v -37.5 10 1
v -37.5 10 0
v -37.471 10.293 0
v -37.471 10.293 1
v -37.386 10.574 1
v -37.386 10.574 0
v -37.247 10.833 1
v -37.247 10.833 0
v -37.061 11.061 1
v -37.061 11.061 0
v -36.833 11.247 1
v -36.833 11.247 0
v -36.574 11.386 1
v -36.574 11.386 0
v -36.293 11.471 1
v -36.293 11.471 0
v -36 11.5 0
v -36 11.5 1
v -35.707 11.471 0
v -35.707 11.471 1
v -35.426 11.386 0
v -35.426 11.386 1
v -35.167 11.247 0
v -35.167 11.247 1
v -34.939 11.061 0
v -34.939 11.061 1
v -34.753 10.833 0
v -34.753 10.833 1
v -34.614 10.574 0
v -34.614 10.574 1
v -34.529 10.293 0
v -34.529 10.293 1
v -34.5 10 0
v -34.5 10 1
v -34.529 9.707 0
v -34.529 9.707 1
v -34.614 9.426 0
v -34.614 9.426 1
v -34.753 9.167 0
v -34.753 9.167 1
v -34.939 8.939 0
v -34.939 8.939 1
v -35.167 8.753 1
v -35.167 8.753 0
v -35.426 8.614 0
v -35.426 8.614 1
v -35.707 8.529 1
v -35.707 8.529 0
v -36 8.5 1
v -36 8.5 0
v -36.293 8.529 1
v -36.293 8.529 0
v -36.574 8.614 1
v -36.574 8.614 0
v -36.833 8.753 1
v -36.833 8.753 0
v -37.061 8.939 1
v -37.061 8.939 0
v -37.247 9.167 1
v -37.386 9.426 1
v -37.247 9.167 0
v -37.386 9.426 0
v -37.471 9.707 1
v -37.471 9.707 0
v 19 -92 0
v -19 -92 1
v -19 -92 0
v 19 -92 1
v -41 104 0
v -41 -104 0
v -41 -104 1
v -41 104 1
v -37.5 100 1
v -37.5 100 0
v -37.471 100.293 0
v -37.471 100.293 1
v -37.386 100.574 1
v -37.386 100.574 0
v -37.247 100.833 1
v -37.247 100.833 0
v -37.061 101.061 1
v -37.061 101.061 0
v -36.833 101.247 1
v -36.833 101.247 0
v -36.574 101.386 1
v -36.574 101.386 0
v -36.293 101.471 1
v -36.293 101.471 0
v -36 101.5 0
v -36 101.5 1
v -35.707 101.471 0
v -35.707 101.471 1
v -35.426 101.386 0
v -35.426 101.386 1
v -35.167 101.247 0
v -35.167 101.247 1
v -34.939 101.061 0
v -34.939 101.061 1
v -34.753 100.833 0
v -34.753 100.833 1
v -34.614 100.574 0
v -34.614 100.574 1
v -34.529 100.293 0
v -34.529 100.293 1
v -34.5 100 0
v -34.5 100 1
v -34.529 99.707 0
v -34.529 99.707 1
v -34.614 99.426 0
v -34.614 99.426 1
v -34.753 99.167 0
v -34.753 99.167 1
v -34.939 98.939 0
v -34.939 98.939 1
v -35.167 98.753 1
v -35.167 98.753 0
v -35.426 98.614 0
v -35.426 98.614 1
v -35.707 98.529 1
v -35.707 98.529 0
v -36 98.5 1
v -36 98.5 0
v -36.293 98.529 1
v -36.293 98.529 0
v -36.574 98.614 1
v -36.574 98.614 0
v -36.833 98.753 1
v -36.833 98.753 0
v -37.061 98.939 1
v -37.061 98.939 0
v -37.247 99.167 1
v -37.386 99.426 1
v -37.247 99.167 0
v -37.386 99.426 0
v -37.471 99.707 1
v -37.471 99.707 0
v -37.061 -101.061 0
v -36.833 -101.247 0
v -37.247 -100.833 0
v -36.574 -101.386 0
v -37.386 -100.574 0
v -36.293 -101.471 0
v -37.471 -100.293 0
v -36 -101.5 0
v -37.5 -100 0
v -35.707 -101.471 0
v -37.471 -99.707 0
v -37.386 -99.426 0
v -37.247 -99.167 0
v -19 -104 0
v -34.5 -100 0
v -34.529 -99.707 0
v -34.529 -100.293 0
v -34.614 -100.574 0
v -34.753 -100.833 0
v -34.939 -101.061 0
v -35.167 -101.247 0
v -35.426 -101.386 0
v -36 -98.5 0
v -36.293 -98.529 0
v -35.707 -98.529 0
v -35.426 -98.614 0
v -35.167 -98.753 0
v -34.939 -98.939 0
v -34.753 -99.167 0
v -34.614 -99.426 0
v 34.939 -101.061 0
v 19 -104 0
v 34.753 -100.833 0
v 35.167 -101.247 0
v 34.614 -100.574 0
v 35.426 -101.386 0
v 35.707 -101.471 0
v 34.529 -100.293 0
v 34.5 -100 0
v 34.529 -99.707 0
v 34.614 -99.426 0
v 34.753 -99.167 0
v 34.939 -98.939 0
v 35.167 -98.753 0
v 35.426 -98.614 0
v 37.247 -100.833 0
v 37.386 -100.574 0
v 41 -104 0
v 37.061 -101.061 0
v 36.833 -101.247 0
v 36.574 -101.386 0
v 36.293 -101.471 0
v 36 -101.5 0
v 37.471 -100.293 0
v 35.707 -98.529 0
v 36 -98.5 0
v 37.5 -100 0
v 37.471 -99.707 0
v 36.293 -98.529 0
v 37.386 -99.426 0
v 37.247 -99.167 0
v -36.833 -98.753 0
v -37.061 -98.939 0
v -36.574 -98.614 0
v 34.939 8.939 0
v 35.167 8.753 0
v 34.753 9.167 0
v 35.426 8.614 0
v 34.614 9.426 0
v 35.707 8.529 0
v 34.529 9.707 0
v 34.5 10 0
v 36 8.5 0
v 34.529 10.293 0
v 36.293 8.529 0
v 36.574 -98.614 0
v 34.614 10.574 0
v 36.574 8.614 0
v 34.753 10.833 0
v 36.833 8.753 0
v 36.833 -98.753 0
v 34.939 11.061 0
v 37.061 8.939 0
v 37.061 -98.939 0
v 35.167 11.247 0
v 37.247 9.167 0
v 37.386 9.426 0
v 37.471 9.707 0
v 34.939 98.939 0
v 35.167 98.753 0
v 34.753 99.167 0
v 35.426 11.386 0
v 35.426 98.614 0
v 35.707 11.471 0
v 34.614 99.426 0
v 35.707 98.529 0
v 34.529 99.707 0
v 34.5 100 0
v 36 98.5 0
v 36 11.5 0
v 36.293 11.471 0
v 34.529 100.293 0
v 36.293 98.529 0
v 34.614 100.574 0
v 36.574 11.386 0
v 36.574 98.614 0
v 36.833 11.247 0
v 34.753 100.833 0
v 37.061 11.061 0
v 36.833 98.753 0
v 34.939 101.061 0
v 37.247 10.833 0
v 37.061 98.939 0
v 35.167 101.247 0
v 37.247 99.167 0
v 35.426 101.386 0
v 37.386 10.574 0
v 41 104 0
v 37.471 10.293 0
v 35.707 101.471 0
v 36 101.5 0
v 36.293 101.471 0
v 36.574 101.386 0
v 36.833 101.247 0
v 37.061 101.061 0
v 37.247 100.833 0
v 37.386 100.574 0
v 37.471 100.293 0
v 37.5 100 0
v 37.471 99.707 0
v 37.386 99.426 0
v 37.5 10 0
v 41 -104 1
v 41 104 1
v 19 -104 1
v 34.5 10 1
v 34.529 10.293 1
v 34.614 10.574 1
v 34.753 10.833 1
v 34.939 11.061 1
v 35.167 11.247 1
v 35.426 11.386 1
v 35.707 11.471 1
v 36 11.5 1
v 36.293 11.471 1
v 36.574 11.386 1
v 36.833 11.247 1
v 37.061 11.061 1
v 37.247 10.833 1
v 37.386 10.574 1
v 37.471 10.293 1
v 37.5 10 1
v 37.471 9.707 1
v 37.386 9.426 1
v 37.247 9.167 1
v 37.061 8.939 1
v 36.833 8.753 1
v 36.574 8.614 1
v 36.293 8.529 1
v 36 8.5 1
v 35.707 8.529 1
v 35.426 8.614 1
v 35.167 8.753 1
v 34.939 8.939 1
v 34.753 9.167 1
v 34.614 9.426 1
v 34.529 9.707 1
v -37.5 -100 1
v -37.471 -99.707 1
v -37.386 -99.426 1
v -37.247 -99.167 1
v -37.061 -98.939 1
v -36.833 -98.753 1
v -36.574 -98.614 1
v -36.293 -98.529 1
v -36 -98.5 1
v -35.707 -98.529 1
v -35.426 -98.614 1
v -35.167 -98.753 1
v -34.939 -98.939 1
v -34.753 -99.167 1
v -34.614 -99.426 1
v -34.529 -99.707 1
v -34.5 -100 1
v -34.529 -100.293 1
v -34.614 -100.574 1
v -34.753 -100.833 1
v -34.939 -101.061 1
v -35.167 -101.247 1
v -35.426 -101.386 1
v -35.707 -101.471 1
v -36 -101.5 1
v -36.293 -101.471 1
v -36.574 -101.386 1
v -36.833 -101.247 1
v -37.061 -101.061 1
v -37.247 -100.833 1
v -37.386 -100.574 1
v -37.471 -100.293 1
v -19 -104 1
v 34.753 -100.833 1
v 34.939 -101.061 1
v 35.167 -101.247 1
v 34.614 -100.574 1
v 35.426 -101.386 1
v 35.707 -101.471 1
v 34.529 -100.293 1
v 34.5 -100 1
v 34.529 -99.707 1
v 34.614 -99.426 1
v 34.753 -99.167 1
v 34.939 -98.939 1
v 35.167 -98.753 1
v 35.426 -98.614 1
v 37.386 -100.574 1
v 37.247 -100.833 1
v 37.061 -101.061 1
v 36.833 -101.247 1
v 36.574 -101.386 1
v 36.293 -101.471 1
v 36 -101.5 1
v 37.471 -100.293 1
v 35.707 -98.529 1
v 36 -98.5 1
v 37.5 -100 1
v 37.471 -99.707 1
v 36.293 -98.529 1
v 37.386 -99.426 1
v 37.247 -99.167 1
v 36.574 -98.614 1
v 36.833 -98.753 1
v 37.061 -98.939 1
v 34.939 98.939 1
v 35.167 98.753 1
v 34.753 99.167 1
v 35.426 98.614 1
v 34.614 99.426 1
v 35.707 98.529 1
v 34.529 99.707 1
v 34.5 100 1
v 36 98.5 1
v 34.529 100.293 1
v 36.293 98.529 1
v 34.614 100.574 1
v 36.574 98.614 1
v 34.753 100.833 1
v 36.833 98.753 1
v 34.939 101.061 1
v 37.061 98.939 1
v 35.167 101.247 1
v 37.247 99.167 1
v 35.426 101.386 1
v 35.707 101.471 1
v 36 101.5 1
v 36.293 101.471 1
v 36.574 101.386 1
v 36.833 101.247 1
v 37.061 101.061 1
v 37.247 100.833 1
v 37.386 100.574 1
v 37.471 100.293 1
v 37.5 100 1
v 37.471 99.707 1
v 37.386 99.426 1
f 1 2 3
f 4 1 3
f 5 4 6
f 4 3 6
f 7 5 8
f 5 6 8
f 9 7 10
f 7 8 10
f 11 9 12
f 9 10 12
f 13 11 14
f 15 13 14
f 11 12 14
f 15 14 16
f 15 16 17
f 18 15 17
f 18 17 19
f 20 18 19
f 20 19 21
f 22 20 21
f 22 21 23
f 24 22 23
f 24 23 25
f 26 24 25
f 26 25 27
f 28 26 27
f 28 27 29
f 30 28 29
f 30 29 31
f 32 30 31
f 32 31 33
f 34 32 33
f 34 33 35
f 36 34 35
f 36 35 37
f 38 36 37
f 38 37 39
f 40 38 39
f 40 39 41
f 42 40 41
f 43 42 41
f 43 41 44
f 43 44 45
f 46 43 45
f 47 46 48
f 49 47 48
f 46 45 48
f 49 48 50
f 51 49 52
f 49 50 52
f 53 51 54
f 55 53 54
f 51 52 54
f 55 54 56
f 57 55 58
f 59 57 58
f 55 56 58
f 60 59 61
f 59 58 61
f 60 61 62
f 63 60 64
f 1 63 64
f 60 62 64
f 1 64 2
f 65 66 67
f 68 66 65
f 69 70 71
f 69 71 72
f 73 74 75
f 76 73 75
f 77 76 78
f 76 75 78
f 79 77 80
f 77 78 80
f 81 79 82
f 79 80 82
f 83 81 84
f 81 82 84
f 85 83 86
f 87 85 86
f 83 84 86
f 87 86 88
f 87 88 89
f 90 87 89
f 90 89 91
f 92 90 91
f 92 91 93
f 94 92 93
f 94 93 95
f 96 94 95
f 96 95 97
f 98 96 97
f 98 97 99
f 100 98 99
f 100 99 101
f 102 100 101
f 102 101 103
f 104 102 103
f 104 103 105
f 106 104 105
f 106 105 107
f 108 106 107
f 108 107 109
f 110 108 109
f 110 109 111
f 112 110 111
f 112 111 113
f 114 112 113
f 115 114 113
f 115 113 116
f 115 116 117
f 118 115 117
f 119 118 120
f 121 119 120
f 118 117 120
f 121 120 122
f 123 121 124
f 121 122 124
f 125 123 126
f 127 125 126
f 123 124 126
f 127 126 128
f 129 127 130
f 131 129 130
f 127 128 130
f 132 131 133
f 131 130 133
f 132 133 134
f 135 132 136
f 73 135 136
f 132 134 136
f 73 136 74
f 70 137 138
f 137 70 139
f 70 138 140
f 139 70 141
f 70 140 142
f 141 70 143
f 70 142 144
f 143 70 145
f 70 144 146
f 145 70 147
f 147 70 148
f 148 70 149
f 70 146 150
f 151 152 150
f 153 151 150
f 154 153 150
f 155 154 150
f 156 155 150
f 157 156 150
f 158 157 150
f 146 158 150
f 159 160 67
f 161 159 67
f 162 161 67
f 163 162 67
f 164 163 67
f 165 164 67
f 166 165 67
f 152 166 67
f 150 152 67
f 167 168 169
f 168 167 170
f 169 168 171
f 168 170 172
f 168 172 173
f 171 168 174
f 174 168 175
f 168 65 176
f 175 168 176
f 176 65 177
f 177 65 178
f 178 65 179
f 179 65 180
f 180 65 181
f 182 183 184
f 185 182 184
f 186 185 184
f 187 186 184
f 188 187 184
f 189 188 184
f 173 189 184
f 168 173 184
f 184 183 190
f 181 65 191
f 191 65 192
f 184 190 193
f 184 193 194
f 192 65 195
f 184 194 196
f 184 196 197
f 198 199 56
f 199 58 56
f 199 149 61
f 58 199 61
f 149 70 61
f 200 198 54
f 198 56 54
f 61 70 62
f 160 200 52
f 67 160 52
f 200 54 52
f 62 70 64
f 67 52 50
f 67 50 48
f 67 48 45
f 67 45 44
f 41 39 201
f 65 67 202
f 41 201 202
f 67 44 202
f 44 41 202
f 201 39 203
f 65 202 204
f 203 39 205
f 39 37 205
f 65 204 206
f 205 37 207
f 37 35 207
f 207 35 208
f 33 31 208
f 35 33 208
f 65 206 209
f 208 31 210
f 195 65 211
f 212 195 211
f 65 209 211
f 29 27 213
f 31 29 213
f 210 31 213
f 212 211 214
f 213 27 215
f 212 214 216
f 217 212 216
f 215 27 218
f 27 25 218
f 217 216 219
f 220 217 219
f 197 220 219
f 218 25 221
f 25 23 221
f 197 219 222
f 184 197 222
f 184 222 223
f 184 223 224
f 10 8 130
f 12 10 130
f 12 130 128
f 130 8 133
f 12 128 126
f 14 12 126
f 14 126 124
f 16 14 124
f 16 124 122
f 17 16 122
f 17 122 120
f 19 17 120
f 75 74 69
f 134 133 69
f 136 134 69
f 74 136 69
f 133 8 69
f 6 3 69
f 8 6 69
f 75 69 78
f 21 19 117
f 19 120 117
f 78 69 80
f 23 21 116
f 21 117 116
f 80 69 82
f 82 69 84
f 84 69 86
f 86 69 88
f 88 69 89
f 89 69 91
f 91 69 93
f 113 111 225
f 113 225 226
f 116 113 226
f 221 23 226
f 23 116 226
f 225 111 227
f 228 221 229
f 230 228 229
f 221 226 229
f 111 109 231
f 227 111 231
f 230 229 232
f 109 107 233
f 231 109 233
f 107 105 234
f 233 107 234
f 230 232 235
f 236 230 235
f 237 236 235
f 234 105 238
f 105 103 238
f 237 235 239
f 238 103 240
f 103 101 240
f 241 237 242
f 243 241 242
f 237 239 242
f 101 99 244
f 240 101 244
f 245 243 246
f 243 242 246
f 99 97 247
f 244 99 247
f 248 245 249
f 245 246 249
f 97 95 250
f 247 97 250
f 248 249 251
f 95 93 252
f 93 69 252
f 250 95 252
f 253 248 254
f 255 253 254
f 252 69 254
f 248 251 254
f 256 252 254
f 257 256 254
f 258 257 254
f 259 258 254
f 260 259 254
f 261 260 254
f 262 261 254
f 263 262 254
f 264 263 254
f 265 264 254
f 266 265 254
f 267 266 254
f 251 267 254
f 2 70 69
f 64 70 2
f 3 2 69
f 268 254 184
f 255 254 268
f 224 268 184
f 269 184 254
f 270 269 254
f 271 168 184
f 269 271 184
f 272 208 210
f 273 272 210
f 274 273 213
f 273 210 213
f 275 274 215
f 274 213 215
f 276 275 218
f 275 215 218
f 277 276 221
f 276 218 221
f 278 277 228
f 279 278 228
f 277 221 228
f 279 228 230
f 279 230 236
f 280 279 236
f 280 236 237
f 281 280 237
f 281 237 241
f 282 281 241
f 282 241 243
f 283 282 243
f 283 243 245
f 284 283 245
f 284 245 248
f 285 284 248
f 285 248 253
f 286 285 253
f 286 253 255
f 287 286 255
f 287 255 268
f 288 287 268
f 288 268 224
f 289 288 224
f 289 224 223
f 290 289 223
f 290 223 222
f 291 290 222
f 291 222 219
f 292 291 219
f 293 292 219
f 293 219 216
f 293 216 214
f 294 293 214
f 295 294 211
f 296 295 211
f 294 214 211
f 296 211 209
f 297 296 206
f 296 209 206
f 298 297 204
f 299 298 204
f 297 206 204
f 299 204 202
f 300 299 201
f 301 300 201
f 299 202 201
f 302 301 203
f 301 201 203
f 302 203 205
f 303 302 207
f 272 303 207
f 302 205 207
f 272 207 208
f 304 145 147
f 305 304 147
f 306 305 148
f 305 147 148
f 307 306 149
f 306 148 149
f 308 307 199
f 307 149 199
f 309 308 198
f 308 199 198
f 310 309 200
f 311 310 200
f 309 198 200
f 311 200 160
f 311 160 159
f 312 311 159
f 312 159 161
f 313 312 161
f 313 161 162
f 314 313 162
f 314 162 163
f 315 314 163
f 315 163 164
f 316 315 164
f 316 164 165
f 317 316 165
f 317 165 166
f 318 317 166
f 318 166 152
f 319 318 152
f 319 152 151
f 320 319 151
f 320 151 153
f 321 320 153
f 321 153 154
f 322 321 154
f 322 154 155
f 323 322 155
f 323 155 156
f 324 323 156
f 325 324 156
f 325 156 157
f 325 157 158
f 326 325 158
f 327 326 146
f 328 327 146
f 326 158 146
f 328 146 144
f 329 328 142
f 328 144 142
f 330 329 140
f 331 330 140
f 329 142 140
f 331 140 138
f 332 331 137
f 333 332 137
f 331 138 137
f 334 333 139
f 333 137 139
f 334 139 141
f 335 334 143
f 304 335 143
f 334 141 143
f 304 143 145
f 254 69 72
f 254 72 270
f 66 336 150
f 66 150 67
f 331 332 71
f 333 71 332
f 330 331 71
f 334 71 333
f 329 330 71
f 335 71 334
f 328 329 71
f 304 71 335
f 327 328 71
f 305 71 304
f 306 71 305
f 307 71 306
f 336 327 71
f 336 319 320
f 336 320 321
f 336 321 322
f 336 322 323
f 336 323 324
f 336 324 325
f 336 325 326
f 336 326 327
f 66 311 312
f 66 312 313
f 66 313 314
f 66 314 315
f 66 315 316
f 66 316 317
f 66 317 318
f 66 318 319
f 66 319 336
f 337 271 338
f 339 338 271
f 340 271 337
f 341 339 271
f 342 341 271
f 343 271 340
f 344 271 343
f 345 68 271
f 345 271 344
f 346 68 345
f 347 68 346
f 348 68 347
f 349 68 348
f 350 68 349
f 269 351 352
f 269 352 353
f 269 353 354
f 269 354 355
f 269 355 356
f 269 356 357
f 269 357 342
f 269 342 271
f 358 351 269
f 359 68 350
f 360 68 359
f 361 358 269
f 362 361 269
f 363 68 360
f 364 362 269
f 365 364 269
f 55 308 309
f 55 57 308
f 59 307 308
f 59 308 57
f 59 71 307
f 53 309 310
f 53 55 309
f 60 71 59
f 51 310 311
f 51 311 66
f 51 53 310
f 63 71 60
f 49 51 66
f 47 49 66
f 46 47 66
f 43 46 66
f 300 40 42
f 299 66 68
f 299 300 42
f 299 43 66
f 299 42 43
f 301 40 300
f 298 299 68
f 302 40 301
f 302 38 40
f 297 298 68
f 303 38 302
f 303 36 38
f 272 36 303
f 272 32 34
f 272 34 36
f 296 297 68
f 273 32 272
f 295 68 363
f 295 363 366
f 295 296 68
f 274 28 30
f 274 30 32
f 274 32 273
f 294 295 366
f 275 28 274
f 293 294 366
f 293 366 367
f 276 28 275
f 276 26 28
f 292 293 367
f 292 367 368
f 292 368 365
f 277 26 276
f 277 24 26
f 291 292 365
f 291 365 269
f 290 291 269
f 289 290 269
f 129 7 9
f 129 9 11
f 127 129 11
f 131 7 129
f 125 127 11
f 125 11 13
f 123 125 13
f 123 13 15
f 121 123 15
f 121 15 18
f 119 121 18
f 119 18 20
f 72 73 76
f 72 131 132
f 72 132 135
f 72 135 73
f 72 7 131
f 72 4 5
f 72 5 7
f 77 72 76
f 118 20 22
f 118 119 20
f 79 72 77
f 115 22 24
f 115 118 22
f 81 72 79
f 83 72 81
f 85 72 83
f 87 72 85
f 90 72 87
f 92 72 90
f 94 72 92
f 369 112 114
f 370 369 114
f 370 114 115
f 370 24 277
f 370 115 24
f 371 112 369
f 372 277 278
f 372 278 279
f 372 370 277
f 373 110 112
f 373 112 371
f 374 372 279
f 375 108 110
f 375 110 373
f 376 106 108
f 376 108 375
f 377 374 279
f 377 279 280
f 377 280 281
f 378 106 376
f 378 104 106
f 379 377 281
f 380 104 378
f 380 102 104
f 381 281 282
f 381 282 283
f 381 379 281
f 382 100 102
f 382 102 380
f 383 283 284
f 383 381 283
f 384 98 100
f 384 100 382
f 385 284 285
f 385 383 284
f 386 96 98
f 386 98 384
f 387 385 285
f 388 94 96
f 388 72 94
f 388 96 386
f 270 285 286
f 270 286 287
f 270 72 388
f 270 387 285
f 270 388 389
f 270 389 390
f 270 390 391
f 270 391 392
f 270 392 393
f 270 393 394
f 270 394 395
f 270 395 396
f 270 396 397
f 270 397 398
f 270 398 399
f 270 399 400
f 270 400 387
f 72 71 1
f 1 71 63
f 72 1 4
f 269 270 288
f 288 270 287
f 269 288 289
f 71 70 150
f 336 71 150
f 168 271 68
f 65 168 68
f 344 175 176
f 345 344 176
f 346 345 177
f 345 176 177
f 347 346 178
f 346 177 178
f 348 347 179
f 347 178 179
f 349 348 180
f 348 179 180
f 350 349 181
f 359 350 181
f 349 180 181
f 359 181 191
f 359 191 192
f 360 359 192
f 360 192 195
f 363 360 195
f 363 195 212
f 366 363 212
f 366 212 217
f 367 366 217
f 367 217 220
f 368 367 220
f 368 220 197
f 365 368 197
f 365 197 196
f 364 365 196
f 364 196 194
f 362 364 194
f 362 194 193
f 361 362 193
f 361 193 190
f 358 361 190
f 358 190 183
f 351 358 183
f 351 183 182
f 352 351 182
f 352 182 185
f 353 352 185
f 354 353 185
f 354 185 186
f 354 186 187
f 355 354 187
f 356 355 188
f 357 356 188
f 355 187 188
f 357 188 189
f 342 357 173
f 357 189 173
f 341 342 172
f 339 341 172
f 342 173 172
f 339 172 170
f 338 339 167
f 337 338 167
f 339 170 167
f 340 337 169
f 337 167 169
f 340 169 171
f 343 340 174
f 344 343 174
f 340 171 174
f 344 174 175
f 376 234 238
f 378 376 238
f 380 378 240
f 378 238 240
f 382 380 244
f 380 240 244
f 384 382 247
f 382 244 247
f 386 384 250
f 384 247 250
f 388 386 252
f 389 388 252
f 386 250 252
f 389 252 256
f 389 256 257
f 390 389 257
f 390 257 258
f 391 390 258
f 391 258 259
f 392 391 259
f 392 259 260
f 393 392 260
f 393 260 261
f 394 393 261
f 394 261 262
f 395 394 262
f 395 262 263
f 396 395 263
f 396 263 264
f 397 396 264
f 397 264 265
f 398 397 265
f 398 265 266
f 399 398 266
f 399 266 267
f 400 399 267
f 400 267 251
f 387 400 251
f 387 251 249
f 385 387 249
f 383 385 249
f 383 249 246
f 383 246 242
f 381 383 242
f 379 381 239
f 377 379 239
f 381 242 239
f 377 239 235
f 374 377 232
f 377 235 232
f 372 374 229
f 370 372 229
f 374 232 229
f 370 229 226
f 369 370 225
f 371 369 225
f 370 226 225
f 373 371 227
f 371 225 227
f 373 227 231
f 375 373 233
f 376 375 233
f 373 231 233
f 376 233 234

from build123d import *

# Parameters (mm, degrees)
SKETCH1_W                = 82
SKETCH1_H                = 208
BOSS_EXTRUDE1_DEPTH      = 1
F_3_0_3_DIAMETER_HOLE1_D = 3
SKETCH4_W                = 38
SKETCH4_H                = 12
CUT_EXTRUDE1_DEPTH       = 10


with BuildPart() as part:
    # Sketch1 → Boss-Extrude1 (new body)
    with BuildSketch(Plane.XY):
        Rectangle(SKETCH1_W, SKETCH1_H)
    extrude(amount=BOSS_EXTRUDE1_DEPTH)

    # Ø3.0 (3) Diameter Hole1 (through all)
    with Locations(Plane.XY.offset(1)):
        with Locations((-36, 10), (36, 10), (36, -100), (-36, -100), (-36, 100), (36, 100)):
            Hole(F_3_0_3_DIAMETER_HOLE1_D / 2)

    # Sketch4 → Cut-Extrude1 (cut)
    with BuildSketch(Plane.XY.offset(1)):
        with Locations((0, -98)):
            Rectangle(SKETCH4_W, SKETCH4_H)
    extrude(amount=-CUT_EXTRUDE1_DEPTH, mode=Mode.SUBTRACT)


solid = part.part
